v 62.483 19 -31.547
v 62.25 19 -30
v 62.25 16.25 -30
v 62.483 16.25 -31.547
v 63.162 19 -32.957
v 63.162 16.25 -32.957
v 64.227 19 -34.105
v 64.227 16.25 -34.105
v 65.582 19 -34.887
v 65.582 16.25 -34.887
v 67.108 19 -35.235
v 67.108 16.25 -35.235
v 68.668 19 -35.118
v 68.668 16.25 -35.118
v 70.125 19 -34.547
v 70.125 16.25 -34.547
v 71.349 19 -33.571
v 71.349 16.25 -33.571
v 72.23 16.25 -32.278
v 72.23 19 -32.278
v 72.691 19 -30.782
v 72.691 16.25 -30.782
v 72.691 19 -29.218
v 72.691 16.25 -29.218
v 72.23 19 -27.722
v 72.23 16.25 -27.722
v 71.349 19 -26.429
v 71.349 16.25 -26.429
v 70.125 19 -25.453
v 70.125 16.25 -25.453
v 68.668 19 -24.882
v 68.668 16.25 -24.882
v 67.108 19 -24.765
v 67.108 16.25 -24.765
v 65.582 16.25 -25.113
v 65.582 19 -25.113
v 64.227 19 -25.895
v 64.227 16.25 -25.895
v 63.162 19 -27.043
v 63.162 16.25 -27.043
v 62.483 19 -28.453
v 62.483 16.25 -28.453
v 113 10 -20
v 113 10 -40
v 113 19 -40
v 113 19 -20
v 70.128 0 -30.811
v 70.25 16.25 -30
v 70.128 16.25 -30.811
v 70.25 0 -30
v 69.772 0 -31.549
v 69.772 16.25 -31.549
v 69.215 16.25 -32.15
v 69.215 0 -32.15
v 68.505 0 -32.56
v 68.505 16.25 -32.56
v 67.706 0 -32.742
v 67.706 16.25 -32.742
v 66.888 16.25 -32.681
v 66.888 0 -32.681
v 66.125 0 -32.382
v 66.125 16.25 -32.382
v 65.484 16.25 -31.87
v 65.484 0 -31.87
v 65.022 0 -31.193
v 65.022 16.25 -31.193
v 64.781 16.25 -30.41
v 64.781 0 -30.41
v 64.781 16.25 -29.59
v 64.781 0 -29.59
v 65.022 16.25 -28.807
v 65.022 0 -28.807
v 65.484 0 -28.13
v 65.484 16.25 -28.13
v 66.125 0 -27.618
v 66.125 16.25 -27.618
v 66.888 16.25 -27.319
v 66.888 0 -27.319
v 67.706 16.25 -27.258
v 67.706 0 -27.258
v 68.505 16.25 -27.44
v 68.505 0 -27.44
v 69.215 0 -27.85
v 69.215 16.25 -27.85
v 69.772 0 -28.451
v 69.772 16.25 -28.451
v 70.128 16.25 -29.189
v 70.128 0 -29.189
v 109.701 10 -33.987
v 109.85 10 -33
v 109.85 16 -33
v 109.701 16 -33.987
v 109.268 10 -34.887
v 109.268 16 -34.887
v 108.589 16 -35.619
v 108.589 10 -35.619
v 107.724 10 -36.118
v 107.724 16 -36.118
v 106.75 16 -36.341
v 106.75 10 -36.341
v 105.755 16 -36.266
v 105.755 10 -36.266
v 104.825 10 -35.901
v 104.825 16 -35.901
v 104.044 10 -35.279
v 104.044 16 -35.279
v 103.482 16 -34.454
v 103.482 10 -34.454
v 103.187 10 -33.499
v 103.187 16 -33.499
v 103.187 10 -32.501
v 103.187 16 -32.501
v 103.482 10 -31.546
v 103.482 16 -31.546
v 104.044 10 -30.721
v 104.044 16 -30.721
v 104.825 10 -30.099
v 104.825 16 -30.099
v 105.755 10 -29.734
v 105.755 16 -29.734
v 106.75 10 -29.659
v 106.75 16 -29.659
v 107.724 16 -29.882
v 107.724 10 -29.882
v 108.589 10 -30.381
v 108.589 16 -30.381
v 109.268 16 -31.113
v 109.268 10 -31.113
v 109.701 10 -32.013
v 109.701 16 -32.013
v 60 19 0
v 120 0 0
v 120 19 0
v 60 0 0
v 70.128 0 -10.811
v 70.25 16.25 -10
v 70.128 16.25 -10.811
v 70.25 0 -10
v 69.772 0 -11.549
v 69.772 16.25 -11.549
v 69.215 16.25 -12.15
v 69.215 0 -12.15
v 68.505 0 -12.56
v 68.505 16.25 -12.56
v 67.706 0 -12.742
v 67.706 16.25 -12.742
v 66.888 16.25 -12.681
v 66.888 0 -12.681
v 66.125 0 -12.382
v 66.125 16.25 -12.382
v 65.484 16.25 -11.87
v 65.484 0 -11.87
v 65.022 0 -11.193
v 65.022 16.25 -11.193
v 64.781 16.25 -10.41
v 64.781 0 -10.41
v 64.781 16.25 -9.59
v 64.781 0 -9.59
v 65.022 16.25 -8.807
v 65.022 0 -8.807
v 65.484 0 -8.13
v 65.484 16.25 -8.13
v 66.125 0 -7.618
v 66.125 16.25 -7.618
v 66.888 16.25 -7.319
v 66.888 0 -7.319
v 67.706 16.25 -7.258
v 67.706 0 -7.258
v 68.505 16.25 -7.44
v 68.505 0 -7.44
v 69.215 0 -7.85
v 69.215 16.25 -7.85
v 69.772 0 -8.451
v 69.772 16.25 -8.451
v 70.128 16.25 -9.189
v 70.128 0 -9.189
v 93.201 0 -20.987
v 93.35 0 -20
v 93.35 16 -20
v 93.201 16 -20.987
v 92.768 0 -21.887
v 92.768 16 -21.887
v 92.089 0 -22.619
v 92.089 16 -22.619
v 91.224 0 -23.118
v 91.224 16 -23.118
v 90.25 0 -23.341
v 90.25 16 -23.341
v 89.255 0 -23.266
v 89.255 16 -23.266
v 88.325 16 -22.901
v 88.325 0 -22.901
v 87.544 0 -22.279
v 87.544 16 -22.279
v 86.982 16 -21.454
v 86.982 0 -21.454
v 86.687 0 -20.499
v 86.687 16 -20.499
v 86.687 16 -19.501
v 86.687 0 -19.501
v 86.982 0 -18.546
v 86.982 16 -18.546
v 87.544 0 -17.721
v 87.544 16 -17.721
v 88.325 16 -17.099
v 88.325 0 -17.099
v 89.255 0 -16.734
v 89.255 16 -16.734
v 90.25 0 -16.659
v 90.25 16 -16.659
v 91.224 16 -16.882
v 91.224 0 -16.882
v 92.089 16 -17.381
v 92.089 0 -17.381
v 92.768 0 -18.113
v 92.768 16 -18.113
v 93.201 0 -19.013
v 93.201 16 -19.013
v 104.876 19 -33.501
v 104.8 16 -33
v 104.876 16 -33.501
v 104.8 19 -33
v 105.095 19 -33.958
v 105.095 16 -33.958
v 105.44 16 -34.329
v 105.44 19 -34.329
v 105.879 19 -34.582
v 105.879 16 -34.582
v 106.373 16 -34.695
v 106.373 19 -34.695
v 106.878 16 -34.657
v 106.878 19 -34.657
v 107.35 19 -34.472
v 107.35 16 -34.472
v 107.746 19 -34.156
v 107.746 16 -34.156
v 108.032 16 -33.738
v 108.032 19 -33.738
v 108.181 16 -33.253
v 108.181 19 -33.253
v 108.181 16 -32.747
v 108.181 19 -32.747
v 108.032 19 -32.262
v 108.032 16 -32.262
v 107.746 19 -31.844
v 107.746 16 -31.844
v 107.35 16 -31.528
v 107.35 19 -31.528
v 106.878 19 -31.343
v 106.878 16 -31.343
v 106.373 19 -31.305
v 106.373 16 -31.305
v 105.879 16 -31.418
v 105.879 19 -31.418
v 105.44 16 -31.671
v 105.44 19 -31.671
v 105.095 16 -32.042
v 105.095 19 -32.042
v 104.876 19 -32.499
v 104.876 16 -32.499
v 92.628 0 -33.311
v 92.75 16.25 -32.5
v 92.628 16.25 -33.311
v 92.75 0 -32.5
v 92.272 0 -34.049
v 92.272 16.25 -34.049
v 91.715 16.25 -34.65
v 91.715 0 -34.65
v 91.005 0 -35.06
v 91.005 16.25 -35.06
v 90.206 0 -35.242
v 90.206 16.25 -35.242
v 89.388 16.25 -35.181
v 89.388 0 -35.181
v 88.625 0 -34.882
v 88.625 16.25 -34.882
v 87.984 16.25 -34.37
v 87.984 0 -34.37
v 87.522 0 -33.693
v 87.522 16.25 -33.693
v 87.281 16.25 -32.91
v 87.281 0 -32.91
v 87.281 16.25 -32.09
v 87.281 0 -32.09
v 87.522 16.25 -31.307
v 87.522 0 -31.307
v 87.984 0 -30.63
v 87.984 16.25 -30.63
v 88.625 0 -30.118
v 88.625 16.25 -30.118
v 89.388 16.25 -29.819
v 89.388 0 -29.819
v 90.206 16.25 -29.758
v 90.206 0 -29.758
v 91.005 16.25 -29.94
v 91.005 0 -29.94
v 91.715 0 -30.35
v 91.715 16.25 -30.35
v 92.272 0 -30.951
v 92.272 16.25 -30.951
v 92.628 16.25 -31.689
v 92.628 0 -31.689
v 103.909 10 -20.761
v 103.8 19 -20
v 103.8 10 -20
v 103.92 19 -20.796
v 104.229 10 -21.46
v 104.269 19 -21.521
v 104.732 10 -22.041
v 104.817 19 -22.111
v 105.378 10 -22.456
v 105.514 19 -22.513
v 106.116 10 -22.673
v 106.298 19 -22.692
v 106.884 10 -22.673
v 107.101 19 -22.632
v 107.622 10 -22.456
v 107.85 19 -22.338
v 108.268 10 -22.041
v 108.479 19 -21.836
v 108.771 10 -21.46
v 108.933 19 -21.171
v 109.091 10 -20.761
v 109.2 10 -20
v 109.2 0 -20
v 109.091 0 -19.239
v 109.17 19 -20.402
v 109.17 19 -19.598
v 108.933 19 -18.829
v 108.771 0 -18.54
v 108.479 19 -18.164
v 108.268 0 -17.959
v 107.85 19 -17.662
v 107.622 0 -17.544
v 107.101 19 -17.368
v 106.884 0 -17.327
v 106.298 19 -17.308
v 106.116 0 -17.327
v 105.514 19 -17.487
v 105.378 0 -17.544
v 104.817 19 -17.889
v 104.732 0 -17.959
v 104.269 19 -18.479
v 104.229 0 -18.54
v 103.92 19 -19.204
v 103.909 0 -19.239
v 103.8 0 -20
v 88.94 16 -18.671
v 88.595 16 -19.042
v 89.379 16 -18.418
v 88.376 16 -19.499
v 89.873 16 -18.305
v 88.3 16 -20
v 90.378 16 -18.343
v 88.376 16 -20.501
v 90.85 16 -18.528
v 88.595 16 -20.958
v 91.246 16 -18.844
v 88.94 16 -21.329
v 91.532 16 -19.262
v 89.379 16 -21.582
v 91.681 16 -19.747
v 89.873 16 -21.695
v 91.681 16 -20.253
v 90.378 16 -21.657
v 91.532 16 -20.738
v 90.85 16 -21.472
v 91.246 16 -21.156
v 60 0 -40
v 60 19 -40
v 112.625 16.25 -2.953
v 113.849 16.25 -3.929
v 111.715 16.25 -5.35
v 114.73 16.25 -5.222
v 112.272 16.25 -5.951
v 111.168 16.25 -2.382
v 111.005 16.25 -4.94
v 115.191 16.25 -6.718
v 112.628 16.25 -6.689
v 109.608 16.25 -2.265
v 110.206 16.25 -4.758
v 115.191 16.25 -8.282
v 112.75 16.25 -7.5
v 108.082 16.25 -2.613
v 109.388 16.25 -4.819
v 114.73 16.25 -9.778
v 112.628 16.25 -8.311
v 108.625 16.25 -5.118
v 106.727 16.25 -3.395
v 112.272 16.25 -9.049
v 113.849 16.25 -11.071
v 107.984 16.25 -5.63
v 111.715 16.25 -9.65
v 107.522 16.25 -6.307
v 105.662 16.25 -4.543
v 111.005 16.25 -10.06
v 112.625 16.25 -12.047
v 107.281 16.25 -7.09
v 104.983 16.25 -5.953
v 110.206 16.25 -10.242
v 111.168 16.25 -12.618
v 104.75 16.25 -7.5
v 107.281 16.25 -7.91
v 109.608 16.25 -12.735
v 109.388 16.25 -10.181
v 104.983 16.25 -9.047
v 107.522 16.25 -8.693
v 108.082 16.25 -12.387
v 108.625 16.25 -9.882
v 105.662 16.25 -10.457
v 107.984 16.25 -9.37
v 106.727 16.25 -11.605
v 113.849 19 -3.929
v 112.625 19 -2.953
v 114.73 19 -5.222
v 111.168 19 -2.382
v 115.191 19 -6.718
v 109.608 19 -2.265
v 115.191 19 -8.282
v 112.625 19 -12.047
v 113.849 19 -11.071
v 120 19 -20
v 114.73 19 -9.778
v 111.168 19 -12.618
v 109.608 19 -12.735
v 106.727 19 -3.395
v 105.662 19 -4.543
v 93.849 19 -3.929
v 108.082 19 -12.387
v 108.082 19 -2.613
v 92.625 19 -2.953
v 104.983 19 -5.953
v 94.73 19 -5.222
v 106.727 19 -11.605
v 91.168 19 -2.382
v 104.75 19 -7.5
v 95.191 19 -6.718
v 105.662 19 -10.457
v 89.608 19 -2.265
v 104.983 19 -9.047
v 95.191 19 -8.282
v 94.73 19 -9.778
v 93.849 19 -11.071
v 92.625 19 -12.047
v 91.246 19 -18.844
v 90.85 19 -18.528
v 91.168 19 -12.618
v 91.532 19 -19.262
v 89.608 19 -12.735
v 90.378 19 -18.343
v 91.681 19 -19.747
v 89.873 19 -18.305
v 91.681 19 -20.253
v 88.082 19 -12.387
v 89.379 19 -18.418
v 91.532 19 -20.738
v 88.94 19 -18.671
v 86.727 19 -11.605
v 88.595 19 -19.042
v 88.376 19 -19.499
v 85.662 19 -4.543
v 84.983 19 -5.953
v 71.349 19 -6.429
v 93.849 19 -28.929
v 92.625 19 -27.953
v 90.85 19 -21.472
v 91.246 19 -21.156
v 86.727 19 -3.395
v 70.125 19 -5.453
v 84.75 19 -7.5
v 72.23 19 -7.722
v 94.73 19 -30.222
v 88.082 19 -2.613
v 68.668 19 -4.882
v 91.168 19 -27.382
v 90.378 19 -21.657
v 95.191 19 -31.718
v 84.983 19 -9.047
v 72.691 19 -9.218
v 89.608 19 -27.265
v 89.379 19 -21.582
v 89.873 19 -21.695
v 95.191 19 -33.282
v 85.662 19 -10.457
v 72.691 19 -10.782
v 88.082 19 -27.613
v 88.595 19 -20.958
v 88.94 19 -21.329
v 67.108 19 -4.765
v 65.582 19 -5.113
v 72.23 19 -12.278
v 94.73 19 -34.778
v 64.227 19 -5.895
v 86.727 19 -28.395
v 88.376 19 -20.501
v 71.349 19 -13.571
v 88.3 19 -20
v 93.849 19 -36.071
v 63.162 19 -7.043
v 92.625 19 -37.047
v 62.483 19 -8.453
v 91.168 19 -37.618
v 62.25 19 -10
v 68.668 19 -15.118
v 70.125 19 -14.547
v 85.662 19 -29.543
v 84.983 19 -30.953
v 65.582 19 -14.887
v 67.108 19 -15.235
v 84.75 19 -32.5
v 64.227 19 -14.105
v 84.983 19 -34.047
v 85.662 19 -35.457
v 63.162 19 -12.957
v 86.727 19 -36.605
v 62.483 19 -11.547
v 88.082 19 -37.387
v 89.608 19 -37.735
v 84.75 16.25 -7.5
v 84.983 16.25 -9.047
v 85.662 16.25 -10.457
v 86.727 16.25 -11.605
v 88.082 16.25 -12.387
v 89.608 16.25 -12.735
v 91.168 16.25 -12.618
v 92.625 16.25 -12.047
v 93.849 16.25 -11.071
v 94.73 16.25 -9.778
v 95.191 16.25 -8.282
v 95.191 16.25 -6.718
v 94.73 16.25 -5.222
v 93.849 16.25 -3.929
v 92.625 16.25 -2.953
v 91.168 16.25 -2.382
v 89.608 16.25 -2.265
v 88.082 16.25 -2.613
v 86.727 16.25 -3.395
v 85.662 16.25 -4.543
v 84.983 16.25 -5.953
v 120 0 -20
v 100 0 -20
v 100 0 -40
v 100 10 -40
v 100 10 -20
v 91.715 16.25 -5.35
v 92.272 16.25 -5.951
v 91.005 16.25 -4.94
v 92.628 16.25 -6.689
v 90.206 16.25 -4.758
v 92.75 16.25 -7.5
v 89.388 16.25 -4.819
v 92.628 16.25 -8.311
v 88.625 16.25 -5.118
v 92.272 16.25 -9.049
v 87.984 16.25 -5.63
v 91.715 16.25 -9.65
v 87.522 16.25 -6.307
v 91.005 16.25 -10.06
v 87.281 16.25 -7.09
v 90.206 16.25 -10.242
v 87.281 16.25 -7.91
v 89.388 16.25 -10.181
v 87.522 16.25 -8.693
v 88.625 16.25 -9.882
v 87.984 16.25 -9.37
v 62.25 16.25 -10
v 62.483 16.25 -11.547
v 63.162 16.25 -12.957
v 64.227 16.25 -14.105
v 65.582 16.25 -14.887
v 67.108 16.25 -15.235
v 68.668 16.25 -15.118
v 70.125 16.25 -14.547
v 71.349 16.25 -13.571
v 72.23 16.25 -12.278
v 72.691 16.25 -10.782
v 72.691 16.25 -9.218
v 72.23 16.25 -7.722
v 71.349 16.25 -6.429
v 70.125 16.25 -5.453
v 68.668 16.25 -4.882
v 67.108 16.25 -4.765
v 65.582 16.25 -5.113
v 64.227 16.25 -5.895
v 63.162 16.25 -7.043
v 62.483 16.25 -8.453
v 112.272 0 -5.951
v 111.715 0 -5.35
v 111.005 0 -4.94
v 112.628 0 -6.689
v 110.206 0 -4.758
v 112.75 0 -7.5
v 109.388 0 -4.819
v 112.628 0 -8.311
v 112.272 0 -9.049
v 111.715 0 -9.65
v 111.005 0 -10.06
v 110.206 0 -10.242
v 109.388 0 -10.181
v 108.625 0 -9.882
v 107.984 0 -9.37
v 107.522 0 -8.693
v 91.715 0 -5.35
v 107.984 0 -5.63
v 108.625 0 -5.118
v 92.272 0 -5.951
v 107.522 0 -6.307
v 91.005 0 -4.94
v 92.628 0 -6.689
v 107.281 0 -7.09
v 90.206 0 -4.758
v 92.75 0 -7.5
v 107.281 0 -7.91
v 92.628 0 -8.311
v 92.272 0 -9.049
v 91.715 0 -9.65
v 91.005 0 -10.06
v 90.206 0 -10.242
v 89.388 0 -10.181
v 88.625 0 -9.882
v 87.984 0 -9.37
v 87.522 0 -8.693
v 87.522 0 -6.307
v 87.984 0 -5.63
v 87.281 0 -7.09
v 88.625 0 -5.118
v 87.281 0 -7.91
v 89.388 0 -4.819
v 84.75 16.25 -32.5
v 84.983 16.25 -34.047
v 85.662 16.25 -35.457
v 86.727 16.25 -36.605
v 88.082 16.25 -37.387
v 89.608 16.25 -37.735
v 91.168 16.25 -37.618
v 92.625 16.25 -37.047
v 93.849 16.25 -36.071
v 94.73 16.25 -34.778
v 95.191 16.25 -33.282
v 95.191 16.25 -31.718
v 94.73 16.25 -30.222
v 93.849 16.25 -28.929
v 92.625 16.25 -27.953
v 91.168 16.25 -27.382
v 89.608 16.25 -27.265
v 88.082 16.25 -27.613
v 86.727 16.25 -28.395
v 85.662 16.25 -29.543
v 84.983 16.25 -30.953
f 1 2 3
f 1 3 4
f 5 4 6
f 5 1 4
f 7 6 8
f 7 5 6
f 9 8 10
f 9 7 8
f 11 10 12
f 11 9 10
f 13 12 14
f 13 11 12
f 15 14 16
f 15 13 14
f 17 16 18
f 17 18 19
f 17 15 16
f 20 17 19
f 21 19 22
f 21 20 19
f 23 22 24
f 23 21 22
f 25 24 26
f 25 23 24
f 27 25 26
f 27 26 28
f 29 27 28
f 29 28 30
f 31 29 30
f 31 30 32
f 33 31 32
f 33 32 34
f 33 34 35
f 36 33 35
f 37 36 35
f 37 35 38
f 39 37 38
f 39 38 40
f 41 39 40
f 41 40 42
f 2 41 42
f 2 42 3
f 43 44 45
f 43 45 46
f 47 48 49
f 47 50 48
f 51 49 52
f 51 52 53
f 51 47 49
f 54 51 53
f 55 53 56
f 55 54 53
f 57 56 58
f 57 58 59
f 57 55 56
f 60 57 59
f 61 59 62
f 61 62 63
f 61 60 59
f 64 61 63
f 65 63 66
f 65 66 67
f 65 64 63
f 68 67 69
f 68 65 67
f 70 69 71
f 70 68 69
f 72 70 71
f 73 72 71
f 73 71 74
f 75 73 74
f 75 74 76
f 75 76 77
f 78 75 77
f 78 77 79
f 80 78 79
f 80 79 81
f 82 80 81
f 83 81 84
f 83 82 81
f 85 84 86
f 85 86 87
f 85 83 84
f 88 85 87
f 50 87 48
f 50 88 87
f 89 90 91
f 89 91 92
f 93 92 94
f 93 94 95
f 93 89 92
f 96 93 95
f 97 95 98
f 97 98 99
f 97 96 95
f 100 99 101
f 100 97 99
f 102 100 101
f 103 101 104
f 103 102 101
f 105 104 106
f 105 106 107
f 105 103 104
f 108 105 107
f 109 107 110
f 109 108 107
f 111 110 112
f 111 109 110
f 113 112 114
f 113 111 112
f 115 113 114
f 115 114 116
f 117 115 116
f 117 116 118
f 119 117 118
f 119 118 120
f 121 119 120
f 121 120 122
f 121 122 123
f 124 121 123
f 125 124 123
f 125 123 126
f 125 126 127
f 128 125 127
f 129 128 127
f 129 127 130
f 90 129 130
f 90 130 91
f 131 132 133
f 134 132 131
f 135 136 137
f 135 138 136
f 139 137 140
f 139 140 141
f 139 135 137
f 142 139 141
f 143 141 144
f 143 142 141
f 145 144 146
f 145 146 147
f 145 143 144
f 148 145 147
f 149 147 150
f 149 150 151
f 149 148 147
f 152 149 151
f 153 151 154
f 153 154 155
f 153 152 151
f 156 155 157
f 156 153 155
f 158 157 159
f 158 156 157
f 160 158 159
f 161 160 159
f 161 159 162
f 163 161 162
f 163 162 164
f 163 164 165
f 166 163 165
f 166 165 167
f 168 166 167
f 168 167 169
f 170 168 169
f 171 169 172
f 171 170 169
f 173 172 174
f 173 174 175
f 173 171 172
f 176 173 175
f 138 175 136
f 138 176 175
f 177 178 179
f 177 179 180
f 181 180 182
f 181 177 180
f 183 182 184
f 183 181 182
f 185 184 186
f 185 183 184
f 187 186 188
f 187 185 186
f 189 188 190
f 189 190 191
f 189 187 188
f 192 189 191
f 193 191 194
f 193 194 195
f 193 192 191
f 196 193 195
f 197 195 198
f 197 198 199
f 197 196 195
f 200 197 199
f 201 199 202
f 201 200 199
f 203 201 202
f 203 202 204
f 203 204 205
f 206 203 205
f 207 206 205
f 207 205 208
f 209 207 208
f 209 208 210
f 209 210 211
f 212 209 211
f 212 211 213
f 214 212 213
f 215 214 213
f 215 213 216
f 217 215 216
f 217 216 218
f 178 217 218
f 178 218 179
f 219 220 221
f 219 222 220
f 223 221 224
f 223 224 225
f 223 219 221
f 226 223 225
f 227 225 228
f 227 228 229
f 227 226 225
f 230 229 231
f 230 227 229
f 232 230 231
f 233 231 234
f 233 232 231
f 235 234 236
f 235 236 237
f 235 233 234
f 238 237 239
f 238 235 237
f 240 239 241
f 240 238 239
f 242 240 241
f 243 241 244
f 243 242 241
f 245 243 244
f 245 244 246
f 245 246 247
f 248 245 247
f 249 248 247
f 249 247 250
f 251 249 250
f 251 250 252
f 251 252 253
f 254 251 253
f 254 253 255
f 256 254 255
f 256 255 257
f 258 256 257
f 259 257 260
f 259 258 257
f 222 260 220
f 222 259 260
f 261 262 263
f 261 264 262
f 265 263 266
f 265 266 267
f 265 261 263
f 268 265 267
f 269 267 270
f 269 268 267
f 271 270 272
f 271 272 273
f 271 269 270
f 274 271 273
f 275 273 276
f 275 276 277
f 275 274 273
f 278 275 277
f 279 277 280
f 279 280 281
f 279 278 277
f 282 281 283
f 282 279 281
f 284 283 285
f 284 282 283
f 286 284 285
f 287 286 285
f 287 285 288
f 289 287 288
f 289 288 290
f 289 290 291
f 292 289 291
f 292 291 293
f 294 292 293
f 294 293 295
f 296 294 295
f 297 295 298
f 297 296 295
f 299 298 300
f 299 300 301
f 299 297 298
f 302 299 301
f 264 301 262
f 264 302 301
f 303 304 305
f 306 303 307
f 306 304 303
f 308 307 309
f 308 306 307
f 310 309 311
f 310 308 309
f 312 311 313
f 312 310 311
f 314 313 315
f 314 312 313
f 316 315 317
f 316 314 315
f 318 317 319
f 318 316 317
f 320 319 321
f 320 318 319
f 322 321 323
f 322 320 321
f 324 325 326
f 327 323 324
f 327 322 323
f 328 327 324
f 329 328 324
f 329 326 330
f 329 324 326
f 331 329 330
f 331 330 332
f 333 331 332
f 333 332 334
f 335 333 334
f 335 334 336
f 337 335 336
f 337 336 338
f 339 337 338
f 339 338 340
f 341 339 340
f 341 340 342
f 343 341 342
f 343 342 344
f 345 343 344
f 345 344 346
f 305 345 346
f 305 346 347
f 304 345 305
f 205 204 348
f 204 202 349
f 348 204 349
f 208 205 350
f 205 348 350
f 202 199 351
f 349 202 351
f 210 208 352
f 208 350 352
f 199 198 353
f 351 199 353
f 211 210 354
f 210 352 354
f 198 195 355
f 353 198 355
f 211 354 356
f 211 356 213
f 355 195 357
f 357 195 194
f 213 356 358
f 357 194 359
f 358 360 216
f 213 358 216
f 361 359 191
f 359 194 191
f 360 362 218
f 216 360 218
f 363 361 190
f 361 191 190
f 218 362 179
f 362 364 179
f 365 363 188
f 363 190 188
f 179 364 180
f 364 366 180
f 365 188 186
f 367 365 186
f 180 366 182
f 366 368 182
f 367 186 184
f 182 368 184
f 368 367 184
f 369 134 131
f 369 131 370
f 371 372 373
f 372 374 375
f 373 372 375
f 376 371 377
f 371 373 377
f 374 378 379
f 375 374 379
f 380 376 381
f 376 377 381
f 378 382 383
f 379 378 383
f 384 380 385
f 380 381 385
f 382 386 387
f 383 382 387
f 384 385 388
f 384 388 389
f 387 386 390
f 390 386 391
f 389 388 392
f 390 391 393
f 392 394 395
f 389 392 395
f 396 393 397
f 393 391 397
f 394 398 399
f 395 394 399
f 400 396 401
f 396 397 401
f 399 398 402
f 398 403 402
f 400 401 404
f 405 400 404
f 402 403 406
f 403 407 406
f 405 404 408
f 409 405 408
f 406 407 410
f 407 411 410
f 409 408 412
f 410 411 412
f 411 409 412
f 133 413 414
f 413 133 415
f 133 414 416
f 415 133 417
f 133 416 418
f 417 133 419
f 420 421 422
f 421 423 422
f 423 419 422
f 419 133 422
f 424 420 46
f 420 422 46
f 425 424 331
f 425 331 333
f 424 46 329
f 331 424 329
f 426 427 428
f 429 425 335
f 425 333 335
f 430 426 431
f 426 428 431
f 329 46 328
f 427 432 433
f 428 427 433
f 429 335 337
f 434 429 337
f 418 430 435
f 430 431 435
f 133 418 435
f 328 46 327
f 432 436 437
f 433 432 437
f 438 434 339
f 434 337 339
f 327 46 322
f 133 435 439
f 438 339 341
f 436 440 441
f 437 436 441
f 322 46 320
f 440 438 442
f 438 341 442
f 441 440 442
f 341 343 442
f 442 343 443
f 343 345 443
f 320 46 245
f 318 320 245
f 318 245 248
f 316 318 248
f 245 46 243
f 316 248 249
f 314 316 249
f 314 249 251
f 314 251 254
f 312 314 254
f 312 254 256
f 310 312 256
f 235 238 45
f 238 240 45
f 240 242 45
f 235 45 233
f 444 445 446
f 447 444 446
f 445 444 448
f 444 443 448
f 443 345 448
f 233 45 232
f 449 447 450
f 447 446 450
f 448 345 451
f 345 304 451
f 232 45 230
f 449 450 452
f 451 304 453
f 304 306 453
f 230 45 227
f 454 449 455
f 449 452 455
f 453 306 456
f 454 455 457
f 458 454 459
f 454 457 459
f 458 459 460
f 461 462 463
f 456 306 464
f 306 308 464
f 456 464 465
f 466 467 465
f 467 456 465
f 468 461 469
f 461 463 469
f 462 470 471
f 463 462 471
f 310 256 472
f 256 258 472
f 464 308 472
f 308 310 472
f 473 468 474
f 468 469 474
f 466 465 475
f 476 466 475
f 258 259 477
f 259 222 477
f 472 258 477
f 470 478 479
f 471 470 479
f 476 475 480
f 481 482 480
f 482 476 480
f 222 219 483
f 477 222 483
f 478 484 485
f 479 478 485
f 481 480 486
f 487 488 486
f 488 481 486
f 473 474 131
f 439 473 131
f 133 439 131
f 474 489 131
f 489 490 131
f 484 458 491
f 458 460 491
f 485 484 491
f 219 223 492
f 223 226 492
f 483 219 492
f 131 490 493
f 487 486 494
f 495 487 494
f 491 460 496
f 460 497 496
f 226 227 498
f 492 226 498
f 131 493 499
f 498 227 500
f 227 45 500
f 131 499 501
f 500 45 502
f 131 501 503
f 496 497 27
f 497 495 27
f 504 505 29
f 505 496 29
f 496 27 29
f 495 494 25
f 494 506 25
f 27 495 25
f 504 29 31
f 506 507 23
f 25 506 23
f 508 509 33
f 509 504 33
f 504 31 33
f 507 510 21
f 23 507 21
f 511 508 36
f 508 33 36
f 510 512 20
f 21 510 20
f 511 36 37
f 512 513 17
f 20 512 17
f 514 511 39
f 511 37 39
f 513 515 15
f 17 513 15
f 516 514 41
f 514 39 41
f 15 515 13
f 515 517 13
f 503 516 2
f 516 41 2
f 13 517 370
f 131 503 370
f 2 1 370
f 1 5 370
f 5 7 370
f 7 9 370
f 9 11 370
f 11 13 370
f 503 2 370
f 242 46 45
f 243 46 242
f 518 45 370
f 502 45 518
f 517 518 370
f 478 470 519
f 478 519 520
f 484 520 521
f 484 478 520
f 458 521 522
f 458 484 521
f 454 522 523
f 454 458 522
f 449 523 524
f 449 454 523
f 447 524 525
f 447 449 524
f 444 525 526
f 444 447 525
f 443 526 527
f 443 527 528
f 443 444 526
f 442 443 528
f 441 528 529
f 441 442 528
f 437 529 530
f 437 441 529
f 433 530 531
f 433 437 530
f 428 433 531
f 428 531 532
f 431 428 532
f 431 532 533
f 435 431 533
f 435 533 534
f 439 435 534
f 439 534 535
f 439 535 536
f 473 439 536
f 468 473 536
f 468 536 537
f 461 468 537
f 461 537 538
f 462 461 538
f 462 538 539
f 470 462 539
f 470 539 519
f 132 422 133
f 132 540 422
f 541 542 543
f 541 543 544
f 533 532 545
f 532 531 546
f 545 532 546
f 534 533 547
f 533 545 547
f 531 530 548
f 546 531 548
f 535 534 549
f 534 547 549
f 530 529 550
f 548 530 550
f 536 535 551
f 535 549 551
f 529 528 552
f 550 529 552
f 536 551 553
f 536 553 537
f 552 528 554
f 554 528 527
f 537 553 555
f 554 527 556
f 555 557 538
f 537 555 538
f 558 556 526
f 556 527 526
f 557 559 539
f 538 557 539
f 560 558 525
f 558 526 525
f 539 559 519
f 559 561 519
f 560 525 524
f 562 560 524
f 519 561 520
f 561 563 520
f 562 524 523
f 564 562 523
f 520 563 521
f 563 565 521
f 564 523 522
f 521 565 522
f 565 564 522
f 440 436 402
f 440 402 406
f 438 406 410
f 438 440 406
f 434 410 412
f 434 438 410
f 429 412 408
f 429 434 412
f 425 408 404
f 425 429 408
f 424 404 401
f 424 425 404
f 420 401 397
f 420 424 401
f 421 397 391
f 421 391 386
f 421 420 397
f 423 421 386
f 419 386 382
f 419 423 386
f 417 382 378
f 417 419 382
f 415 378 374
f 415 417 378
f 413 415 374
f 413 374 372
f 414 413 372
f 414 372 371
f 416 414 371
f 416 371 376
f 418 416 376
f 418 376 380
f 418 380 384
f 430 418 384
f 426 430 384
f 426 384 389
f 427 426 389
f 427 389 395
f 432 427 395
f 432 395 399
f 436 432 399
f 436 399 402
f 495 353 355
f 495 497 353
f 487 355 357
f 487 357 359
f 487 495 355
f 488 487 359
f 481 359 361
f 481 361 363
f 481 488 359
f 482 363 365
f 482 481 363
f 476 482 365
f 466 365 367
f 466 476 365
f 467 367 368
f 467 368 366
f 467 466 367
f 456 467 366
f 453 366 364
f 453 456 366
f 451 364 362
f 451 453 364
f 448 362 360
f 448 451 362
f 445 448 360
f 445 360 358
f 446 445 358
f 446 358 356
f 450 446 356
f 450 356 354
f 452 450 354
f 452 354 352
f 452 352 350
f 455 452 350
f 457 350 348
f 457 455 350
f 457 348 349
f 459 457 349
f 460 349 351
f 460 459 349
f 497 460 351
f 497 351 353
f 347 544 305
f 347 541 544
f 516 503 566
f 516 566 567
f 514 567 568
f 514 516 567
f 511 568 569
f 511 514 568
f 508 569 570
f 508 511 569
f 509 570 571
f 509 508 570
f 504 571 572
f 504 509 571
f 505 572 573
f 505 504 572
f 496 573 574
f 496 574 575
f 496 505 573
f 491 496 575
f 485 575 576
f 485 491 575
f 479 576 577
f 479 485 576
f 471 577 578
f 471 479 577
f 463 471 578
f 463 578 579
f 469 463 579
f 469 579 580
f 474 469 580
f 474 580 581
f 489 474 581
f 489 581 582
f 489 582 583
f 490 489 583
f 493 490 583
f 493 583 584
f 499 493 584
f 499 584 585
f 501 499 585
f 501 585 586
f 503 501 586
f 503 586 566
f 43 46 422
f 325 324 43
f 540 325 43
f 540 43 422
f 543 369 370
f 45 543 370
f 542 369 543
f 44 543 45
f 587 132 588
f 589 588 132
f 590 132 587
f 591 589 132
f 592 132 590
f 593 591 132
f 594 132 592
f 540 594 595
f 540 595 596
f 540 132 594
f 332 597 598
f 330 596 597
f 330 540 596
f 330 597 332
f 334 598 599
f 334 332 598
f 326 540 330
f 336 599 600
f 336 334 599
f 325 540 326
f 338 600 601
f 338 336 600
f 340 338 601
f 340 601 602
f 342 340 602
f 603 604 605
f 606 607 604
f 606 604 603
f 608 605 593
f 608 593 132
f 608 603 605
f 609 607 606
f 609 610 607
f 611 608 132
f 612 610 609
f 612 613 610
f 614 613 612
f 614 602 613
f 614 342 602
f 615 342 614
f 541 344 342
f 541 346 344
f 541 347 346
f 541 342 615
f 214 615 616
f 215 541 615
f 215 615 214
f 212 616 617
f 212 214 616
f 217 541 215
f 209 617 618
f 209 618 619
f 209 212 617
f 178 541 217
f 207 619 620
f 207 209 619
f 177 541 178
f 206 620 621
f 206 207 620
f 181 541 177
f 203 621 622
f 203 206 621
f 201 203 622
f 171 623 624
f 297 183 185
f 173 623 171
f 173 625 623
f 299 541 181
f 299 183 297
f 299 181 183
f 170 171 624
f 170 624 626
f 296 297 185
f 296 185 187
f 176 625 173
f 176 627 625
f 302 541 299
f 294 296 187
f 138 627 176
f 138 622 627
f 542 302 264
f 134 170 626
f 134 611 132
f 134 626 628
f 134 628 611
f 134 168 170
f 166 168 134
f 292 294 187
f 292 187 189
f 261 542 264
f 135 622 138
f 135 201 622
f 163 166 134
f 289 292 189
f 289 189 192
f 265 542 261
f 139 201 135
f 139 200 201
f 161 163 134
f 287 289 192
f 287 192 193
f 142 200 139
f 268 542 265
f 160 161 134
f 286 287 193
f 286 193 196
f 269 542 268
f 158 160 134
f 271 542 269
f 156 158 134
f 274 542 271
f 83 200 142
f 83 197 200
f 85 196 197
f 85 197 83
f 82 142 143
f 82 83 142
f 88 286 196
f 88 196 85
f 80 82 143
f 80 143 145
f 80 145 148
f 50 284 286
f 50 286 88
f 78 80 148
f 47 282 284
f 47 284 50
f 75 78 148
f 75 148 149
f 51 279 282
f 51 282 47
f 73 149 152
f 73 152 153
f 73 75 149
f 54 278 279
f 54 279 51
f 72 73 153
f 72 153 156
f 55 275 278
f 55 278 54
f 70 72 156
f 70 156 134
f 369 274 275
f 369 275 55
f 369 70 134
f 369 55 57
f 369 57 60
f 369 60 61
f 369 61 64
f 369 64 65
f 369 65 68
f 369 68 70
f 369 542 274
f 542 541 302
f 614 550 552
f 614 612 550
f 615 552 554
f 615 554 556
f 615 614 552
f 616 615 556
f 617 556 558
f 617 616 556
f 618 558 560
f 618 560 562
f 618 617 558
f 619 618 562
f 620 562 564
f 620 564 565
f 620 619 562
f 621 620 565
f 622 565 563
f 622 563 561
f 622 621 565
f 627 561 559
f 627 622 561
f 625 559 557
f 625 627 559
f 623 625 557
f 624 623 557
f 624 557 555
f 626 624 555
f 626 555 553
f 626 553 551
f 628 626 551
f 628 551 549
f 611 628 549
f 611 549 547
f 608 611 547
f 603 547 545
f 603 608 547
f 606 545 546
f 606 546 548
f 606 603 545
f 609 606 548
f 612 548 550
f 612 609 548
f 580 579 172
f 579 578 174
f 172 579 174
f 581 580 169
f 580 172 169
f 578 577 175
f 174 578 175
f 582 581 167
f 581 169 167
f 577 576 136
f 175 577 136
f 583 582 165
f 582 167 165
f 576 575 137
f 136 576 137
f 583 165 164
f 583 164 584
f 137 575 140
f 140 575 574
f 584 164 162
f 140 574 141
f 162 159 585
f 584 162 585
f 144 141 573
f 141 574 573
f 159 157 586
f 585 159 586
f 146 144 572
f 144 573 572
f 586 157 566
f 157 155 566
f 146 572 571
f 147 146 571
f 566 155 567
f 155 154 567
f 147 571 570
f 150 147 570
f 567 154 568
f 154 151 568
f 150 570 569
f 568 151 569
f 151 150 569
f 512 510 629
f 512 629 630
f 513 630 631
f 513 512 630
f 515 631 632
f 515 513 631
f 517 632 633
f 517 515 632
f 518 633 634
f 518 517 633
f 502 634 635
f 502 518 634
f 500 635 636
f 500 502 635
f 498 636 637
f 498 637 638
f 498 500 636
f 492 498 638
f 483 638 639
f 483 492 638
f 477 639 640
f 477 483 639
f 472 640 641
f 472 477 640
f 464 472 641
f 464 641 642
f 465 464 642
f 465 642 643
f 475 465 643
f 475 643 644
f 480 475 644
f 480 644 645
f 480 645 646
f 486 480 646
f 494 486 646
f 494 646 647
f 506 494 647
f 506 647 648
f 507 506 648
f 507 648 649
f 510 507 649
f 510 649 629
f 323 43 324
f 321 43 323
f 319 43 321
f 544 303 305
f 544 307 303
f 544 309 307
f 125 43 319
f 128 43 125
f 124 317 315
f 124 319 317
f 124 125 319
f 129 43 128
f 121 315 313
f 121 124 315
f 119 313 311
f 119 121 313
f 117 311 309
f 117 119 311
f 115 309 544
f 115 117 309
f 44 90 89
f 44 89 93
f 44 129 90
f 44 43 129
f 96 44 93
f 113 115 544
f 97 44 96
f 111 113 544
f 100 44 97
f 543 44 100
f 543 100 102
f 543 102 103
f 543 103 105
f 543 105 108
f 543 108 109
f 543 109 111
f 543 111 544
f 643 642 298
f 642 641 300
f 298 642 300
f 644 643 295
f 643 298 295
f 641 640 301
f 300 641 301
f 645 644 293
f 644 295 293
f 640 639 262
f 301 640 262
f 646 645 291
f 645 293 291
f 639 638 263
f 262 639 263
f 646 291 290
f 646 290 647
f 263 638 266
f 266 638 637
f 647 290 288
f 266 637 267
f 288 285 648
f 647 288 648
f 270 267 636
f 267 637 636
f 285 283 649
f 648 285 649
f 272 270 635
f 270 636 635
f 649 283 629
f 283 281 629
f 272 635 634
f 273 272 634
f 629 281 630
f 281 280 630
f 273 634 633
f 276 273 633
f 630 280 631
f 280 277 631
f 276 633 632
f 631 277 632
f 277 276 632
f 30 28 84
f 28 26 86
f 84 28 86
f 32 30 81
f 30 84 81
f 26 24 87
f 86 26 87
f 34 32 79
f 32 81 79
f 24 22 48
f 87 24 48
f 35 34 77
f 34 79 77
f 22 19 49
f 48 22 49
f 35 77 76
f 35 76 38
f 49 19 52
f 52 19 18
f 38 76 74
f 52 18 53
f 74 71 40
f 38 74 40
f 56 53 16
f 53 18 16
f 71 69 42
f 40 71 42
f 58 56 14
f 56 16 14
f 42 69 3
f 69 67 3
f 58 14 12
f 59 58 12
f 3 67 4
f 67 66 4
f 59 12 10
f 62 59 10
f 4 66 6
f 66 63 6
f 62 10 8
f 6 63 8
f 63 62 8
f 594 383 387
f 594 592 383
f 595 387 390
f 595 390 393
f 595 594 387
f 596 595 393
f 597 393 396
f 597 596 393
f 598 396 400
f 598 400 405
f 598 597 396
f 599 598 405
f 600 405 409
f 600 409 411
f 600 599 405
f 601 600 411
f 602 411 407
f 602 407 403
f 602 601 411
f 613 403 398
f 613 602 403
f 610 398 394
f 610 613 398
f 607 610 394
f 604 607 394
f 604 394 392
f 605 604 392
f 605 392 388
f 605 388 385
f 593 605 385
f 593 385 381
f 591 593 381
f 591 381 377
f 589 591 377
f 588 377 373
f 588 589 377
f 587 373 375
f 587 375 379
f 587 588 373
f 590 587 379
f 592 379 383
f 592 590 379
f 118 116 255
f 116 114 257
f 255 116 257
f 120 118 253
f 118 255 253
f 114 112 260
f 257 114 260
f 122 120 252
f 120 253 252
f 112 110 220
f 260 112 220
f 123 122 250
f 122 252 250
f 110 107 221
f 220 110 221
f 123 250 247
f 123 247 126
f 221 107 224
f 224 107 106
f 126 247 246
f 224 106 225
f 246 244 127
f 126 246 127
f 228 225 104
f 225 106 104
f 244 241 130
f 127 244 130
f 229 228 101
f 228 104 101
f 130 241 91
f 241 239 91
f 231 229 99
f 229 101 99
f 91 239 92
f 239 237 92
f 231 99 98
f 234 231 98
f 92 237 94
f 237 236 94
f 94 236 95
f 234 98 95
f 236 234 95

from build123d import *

# Parameters (mm, degrees)
BOSS_EXTRUDE1_DEPTH             = 10
BOSS_EXTRUDE2_DEPTH             = 9
CBORE_FOR_M5_SBHCS1_D           = 5.5
CBORE_FOR_M5_SBHCS1_CBORE_D     = 10.5
CBORE_FOR_M5_SBHCS1_CBORE_DEPTH = 2.75
CBORE_FOR_M5_SBHCS2_D           = 5.5
CBORE_FOR_M5_SBHCS2_CBORE_D     = 10.5
CBORE_FOR_M5_SBHCS2_CBORE_DEPTH = 2.75
CBORE_FOR_M3_SBHCS1_D           = 3.4
CBORE_FOR_M3_SBHCS1_CBORE_D     = 6.7
CBORE_FOR_M3_SBHCS1_CBORE_DEPTH = 16
CBORE_FOR_M3_SBHCS2_D           = 3.4
CBORE_FOR_M3_SBHCS2_CBORE_D     = 6.7
CBORE_FOR_M3_SBHCS2_CBORE_DEPTH = 6
F_5_4_5_4_DIAMETER_HOLE1_D      = 5.4


with BuildPart() as part:
    # Sketch1 → Boss-Extrude1 (new body)
    with BuildSketch(Plane(origin=(0, 0, 0), x_dir=(1, 0, 0), z_dir=(0, 1, 0))):
        Polygon((0, 0), (60, 0), (60, 40), (20, 40), (20, 20), (0, 20), align=None)
    extrude(amount=BOSS_EXTRUDE1_DEPTH)

    # Sketch2 → Boss-Extrude2 (add)
    with BuildSketch(Plane(origin=(0, 10, 0), x_dir=(1, 0, 0), z_dir=(0, 1, 0))):
        Polygon((20, 40), (7, 40), (7, 20), (0, 20), (0, 0), (60, 0), (60, 40), align=None)
    extrude(amount=BOSS_EXTRUDE2_DEPTH)

    # CBORE for M5 SBHCS1 (through all)
    with Locations(Plane(origin=(0, 19, 0), x_dir=(1, 0, 0), z_dir=(0, 1, 0))):
        with Locations((10, 7.5), (30, 7.5), (30, 32.5)):
            CounterBoreHole(CBORE_FOR_M5_SBHCS1_D / 2, CBORE_FOR_M5_SBHCS1_CBORE_D / 2, CBORE_FOR_M5_SBHCS1_CBORE_DEPTH)

    # CBORE for M5 SBHCS2 (through all)
    with Locations(Plane(origin=(0, 19, 0), x_dir=(1, 0, 0), z_dir=(0, 1, 0))):
        with Locations((52.5, 30), (52.5, 10)):
            CounterBoreHole(CBORE_FOR_M5_SBHCS2_D / 2, CBORE_FOR_M5_SBHCS2_CBORE_D / 2, CBORE_FOR_M5_SBHCS2_CBORE_DEPTH)

    # CBORE for M3 SBHCS1 (through all)
    with Locations(Plane(origin=(0, 0, 0), x_dir=(-1, 0, 0), z_dir=(0, -1, 0))):
        with Locations((-30, 20)):
            CounterBoreHole(CBORE_FOR_M3_SBHCS1_D / 2, CBORE_FOR_M3_SBHCS1_CBORE_D / 2, CBORE_FOR_M3_SBHCS1_CBORE_DEPTH)

    # CBORE for M3 SBHCS2 (through all)
    with Locations(Plane(origin=(0, 10, 0), x_dir=(-1, 0, 0), z_dir=(0, -1, 0))):
        with Locations((-13.5, 33)):
            CounterBoreHole(CBORE_FOR_M3_SBHCS2_D / 2, CBORE_FOR_M3_SBHCS2_CBORE_D / 2, CBORE_FOR_M3_SBHCS2_CBORE_DEPTH)

    # Ø5.4 (5.4) Diameter Hole1 (through all)
    with Locations(Plane(origin=(0, 0, 0), x_dir=(-1, 0, 0), z_dir=(0, -1, 0))):
        with Locations((-13.5, 20)):
            Hole(F_5_4_5_4_DIAMETER_HOLE1_D / 2)


with BuildPart() as body_2:
    # Mirror1: mirrored copy
    add(part.part.mirror(Plane(origin=(60, 10, 0), x_dir=(0, 0, 1), z_dir=(-1, 0, 0))))


solid = body_2.part
